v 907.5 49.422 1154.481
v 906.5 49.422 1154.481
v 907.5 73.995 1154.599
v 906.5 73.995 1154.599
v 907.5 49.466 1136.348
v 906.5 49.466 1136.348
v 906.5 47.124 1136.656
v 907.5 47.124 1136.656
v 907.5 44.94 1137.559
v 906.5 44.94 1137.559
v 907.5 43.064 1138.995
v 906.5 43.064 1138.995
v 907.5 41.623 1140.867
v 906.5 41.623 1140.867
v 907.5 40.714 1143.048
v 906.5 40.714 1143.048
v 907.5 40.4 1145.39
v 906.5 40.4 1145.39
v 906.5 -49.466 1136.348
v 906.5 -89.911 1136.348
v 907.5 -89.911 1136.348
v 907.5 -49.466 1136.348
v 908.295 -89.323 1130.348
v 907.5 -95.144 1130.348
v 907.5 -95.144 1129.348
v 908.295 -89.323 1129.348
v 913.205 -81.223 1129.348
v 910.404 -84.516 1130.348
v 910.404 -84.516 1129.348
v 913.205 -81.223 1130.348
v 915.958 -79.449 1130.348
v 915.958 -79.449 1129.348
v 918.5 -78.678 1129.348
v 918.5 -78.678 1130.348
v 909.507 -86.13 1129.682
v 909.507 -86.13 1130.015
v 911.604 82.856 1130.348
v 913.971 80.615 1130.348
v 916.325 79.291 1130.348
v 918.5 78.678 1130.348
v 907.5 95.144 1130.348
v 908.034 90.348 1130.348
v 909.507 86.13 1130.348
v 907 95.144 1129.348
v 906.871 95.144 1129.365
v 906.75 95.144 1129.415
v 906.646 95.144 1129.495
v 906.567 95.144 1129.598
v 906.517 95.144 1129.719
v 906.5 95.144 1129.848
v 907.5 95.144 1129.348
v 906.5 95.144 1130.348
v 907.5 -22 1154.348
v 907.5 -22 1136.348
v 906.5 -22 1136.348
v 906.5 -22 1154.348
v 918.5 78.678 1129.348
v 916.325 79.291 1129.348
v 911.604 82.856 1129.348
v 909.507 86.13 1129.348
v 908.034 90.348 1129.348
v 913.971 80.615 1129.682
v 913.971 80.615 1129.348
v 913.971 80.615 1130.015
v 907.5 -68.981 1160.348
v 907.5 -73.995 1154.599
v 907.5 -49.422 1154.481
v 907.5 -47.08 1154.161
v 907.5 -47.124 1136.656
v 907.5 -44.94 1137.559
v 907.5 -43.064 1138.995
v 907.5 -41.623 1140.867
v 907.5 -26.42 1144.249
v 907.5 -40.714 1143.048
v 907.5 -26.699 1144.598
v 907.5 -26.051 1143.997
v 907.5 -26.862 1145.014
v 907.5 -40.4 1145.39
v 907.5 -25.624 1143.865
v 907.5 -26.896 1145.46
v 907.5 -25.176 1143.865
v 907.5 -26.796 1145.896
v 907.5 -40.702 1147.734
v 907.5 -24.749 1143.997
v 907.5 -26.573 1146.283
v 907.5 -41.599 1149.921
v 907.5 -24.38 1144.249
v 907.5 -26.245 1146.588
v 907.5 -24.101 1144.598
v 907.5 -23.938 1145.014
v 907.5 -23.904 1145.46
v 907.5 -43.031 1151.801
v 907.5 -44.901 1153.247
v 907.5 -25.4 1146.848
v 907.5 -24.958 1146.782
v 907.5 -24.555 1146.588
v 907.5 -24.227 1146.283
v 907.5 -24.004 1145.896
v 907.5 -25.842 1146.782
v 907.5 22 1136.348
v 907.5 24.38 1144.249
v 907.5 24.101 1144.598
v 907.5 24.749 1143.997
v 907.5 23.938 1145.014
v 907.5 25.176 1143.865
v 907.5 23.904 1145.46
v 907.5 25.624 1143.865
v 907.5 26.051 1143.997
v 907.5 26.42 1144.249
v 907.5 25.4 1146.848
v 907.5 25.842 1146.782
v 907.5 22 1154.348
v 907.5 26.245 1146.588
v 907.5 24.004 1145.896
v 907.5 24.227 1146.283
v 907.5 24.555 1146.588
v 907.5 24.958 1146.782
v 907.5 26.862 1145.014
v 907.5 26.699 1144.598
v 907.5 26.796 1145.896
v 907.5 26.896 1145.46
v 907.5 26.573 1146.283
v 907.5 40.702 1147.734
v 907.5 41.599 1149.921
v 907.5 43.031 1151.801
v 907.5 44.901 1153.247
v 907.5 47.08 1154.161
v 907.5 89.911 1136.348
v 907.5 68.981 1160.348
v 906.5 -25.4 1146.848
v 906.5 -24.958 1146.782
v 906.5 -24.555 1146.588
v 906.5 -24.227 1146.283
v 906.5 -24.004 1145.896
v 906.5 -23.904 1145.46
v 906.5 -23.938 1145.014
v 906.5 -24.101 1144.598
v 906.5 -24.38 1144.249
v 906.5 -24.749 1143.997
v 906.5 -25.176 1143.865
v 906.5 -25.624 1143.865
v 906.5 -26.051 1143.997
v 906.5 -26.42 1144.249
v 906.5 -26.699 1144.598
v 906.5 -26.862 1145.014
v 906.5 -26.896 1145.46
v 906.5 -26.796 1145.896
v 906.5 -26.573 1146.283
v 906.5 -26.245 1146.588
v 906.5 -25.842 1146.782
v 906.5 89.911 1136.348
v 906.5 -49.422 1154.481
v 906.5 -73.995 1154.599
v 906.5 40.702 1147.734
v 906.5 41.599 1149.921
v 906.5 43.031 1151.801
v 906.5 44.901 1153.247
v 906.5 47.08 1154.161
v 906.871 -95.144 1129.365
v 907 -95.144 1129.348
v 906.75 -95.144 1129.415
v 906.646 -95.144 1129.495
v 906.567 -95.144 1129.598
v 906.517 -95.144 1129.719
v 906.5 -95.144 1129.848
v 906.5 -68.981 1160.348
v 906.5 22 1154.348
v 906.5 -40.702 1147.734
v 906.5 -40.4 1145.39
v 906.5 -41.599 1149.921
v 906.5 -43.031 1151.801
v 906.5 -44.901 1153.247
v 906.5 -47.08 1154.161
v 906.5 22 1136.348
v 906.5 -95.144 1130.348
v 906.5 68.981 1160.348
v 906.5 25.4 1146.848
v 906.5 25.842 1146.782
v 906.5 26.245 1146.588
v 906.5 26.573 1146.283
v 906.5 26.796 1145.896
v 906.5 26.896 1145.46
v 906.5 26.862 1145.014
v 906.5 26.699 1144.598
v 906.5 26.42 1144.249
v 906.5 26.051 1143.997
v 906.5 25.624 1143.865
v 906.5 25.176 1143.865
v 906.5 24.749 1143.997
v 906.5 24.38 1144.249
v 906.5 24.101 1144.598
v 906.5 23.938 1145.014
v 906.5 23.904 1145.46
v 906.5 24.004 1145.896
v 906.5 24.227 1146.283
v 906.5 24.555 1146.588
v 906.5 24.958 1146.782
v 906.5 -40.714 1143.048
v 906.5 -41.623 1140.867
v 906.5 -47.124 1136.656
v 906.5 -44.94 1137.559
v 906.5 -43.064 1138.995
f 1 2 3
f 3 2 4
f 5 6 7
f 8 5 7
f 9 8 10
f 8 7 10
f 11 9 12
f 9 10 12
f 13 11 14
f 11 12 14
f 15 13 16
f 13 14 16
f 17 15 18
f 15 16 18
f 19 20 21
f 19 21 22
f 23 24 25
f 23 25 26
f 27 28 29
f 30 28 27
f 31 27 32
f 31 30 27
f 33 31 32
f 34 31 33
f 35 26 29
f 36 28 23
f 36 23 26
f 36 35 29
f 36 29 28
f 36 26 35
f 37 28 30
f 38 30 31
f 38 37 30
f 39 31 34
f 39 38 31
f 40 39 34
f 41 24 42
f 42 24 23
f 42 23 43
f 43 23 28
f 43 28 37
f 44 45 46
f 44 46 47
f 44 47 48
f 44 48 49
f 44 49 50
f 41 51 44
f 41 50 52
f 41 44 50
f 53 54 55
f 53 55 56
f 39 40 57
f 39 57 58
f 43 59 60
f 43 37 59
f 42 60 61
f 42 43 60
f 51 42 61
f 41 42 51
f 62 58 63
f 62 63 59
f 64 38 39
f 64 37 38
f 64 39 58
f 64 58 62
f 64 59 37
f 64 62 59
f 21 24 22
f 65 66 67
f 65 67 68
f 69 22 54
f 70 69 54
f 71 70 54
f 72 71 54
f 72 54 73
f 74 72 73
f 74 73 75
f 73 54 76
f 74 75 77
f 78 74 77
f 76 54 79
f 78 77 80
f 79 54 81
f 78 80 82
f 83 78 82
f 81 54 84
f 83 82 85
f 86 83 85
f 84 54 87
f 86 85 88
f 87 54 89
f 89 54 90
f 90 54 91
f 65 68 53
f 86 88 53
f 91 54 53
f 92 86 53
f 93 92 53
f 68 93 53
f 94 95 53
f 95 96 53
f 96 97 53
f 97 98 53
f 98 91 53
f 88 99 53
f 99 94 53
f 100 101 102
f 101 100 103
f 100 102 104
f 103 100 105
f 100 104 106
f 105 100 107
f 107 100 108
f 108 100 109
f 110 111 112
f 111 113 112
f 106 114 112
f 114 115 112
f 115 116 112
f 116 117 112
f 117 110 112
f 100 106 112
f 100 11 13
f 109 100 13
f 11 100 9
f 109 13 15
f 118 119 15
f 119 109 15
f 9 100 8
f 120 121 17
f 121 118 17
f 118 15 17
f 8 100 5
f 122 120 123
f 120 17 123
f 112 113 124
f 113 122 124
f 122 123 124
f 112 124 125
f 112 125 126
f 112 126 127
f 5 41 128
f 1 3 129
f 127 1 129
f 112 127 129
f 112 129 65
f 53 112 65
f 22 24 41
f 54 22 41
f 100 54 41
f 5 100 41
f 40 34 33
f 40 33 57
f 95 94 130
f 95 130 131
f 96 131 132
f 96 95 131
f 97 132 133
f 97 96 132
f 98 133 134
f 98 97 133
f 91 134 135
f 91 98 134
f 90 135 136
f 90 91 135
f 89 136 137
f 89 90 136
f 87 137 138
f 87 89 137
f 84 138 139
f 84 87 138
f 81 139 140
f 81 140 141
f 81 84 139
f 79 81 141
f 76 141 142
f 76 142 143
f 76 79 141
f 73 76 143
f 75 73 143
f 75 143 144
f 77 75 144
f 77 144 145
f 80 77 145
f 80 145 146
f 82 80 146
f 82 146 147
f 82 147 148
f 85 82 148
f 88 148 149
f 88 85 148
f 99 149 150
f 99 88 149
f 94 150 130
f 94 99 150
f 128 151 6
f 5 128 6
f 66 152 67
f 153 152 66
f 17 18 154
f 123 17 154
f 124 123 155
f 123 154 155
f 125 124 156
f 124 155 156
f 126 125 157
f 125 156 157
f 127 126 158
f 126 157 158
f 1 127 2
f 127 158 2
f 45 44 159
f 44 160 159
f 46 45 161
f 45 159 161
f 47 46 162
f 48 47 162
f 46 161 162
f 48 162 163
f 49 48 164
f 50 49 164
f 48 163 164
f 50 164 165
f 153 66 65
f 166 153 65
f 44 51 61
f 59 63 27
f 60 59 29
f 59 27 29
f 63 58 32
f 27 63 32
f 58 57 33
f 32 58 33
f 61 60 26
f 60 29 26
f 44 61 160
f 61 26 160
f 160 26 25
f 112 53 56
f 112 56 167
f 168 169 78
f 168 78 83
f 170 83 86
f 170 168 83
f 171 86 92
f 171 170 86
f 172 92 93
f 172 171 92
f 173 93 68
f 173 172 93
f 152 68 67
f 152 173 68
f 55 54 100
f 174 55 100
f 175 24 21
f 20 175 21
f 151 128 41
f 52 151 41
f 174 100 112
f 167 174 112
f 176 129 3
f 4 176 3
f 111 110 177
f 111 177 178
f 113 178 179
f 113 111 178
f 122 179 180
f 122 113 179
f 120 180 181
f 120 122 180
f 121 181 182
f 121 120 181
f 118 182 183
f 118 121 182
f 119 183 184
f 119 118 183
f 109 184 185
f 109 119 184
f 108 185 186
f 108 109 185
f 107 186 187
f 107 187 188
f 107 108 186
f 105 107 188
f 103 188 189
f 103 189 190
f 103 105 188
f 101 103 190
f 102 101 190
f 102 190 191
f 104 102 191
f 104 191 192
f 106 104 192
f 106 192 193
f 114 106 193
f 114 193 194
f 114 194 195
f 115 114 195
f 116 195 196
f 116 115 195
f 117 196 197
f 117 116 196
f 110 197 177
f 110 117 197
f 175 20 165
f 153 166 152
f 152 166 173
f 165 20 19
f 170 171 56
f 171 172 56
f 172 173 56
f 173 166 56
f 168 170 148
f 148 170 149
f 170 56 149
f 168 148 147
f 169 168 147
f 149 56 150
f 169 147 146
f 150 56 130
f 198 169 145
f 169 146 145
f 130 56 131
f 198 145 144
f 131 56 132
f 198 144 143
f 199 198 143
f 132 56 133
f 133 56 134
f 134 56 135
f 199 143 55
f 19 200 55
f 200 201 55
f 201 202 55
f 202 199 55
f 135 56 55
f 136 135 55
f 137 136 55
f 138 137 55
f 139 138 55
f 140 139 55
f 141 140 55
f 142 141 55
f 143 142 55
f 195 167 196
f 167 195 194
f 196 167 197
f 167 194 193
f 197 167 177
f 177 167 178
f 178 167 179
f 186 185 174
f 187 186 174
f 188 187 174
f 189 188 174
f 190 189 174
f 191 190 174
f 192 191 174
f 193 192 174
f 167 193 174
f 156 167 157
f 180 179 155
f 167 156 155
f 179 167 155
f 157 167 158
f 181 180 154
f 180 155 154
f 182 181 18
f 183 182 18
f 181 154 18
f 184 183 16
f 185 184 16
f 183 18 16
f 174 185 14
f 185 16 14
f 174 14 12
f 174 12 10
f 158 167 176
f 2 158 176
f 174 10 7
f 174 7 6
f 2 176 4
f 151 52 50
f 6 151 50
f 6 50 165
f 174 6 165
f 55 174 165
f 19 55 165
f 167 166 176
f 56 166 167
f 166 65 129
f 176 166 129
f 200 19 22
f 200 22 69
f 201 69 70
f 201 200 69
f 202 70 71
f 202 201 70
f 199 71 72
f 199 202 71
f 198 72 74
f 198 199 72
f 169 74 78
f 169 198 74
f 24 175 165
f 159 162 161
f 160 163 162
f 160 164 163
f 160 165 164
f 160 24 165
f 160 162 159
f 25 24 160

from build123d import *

# Parameters (mm, degrees)
SZKIC1_R                    = 1.5
SZKIC1_W                    = 18
SZKIC1_H                    = 44
DODANIE_WYCI_GNI_CIE1_DEPTH = 1
DODANIE_WYCI_GNI_CIE2_DEPTH = 1
DODANIE_WYCI_GNI_CIE3_DEPTH = 1
ZAOKR_GLENIE2_R             = 0.5
WYTNIJ_WYCI_GNI_CIE1_DEPTH  = 1


with BuildPart() as part:
    # Szkic1 → Dodanie-wyciągnięcie1 (new body)
    with BuildSketch(Plane.ZY.offset(-907.5)):
        with BuildLine():
            Line((1160.348252133, 68.981105632), (1130.348252133, 95.143896329))
            Line((1130.348252133, 95.143896329), (1130.348252133, 25.4))
            ThreePointArc((1130.348252133, 25.4), (1145.348252133, 40.4), (1160.348252133, 25.4))
            Line((1160.348252133, 25.4), (1160.348252133, 68.981105632))
        make_face()
        with BuildLine():
            ThreePointArc((1160.348252133, -25.4), (1145.348252133, -40.4), (1130.348252133, -25.4))
            Line((1130.348252133, -25.4), (1130.348252133, -95.143896329))
            Line((1130.348252133, -95.143896329), (1160.348252133, -68.981105632))
            Line((1160.348252133, -68.981105632), (1160.348252133, -25.4))
        make_face()
        with BuildLine():
            ThreePointArc((1160.348252133, 25.4), (1145.348252133, 40.4), (1130.348252133, 25.4))
            Line((1130.348252133, 25.4), (1130.348252133, -25.4))
            ThreePointArc((1130.348252133, -25.4), (1145.348252133, -40.4), (1160.348252133, -25.4))
            Line((1160.348252133, -25.4), (1160.348252133, 25.4))
        make_face()
        with Locations((1145.348252133, -25.4)):
            Circle(SZKIC1_R, mode=Mode.SUBTRACT)
        with Locations((1145.348252133, 0)):
            Rectangle(SZKIC1_W, SZKIC1_H, mode=Mode.SUBTRACT)
        with Locations((1145.348252133, 25.4)):
            Circle(SZKIC1_R, mode=Mode.SUBTRACT)
    extrude(amount=DODANIE_WYCI_GNI_CIE1_DEPTH)



with BuildPart() as body_2:
    # Szkic6 → Dodanie-wyciągnięcie2 (new body)
    with BuildSketch(Plane(origin=(0, 0, 1130.348252133), x_dir=(-1, 0, 0), z_dir=(0, 0, -1))):
        with BuildLine():
            Line((-907.5, 95.143896329), (-907.5, -95.143896329))
            add(Edge.make_bspline(
                [(-907.5, -95.143896329), (-907.5, -85.342796857), (-912.688679245, -79.610078298), (-918.5, -78.678049216)],
                knots=[0.75, 0.75, 0.75, 0.75, 0.971601315, 0.971601315, 0.971601315, 0.971601315], degree=3, weights=[0.5, 0.5, 0.630952381, 0.892857143]))
            Line((-918.5, -78.678049216), (-918.5, 78.678049216))
            add(Edge.make_bspline(
                [(-918.5, 78.678049216), (-912.688679245, 79.610078298), (-907.5, 85.342796857), (-907.5, 95.143896329)],
                knots=[0.528398685, 0.528398685, 0.528398685, 0.528398685, 0.75, 0.75, 0.75, 0.75], degree=3, weights=[0.892857143, 0.630952381, 0.5, 0.5]))
        make_face()
    extrude(amount=DODANIE_WYCI_GNI_CIE2_DEPTH)


with BuildPart() as part_1:
    add(part.part)

    add(body_2.part)  # Dodanie-wyciągnięcie3 merges body 2
    # Szkic7 → Dodanie-wyciągnięcie3 (add)
    with BuildSketch(Plane.ZY.offset(-907.5)):
        Polygon((1129.348252133, -95.143896329), (1129.348252133, 94.307952804), (1129.348252133, 95.143896329), (1130.348252133, 95.143896329), (1130.348252133, -95.143896329), align=None)
    extrude(amount=DODANIE_WYCI_GNI_CIE3_DEPTH)

    # Zaokrąglenie2
    zaokr_glenie2_edges = [part_1.edges().sort_by_distance(p)[0] for p in [
        (906.5, 0, 1129.348252133),
    ]]
    fillet(zaokr_glenie2_edges, radius=ZAOKR_GLENIE2_R)

    # Szkic8 → Wytnij-wyciągnięcie1 (cut)
    with BuildSketch(Plane.ZY.offset(-906.5)):
        with BuildLine():
            ThreePointArc((1145.389561405, 40.399943118), (1151.80100132, 43.031096304), (1154.480703078, 49.422397217))
            Line((1154.480703078, 49.422397217), (1154.599387747, 73.994650155))
            Line((1154.599387747, 73.994650155), (1136.348252133, 89.91133819))
            Line((1136.348252133, 89.91133819), (1136.348252133, 49.466187083))
            ThreePointArc((1136.348252133, 49.466187083), (1138.99488175, 43.064194171), (1145.389561405, 40.399943118))
        make_face()
    wytnij_wyci_gni_cie1 = extrude(amount=-WYTNIJ_WYCI_GNI_CIE1_DEPTH, mode=Mode.SUBTRACT)

    # Lustro1: Wytnij-wyciągnięcie1 across plane
    add(wytnij_wyci_gni_cie1.mirror(Plane.ZX), mode=Mode.SUBTRACT)


solid = part_1.part
